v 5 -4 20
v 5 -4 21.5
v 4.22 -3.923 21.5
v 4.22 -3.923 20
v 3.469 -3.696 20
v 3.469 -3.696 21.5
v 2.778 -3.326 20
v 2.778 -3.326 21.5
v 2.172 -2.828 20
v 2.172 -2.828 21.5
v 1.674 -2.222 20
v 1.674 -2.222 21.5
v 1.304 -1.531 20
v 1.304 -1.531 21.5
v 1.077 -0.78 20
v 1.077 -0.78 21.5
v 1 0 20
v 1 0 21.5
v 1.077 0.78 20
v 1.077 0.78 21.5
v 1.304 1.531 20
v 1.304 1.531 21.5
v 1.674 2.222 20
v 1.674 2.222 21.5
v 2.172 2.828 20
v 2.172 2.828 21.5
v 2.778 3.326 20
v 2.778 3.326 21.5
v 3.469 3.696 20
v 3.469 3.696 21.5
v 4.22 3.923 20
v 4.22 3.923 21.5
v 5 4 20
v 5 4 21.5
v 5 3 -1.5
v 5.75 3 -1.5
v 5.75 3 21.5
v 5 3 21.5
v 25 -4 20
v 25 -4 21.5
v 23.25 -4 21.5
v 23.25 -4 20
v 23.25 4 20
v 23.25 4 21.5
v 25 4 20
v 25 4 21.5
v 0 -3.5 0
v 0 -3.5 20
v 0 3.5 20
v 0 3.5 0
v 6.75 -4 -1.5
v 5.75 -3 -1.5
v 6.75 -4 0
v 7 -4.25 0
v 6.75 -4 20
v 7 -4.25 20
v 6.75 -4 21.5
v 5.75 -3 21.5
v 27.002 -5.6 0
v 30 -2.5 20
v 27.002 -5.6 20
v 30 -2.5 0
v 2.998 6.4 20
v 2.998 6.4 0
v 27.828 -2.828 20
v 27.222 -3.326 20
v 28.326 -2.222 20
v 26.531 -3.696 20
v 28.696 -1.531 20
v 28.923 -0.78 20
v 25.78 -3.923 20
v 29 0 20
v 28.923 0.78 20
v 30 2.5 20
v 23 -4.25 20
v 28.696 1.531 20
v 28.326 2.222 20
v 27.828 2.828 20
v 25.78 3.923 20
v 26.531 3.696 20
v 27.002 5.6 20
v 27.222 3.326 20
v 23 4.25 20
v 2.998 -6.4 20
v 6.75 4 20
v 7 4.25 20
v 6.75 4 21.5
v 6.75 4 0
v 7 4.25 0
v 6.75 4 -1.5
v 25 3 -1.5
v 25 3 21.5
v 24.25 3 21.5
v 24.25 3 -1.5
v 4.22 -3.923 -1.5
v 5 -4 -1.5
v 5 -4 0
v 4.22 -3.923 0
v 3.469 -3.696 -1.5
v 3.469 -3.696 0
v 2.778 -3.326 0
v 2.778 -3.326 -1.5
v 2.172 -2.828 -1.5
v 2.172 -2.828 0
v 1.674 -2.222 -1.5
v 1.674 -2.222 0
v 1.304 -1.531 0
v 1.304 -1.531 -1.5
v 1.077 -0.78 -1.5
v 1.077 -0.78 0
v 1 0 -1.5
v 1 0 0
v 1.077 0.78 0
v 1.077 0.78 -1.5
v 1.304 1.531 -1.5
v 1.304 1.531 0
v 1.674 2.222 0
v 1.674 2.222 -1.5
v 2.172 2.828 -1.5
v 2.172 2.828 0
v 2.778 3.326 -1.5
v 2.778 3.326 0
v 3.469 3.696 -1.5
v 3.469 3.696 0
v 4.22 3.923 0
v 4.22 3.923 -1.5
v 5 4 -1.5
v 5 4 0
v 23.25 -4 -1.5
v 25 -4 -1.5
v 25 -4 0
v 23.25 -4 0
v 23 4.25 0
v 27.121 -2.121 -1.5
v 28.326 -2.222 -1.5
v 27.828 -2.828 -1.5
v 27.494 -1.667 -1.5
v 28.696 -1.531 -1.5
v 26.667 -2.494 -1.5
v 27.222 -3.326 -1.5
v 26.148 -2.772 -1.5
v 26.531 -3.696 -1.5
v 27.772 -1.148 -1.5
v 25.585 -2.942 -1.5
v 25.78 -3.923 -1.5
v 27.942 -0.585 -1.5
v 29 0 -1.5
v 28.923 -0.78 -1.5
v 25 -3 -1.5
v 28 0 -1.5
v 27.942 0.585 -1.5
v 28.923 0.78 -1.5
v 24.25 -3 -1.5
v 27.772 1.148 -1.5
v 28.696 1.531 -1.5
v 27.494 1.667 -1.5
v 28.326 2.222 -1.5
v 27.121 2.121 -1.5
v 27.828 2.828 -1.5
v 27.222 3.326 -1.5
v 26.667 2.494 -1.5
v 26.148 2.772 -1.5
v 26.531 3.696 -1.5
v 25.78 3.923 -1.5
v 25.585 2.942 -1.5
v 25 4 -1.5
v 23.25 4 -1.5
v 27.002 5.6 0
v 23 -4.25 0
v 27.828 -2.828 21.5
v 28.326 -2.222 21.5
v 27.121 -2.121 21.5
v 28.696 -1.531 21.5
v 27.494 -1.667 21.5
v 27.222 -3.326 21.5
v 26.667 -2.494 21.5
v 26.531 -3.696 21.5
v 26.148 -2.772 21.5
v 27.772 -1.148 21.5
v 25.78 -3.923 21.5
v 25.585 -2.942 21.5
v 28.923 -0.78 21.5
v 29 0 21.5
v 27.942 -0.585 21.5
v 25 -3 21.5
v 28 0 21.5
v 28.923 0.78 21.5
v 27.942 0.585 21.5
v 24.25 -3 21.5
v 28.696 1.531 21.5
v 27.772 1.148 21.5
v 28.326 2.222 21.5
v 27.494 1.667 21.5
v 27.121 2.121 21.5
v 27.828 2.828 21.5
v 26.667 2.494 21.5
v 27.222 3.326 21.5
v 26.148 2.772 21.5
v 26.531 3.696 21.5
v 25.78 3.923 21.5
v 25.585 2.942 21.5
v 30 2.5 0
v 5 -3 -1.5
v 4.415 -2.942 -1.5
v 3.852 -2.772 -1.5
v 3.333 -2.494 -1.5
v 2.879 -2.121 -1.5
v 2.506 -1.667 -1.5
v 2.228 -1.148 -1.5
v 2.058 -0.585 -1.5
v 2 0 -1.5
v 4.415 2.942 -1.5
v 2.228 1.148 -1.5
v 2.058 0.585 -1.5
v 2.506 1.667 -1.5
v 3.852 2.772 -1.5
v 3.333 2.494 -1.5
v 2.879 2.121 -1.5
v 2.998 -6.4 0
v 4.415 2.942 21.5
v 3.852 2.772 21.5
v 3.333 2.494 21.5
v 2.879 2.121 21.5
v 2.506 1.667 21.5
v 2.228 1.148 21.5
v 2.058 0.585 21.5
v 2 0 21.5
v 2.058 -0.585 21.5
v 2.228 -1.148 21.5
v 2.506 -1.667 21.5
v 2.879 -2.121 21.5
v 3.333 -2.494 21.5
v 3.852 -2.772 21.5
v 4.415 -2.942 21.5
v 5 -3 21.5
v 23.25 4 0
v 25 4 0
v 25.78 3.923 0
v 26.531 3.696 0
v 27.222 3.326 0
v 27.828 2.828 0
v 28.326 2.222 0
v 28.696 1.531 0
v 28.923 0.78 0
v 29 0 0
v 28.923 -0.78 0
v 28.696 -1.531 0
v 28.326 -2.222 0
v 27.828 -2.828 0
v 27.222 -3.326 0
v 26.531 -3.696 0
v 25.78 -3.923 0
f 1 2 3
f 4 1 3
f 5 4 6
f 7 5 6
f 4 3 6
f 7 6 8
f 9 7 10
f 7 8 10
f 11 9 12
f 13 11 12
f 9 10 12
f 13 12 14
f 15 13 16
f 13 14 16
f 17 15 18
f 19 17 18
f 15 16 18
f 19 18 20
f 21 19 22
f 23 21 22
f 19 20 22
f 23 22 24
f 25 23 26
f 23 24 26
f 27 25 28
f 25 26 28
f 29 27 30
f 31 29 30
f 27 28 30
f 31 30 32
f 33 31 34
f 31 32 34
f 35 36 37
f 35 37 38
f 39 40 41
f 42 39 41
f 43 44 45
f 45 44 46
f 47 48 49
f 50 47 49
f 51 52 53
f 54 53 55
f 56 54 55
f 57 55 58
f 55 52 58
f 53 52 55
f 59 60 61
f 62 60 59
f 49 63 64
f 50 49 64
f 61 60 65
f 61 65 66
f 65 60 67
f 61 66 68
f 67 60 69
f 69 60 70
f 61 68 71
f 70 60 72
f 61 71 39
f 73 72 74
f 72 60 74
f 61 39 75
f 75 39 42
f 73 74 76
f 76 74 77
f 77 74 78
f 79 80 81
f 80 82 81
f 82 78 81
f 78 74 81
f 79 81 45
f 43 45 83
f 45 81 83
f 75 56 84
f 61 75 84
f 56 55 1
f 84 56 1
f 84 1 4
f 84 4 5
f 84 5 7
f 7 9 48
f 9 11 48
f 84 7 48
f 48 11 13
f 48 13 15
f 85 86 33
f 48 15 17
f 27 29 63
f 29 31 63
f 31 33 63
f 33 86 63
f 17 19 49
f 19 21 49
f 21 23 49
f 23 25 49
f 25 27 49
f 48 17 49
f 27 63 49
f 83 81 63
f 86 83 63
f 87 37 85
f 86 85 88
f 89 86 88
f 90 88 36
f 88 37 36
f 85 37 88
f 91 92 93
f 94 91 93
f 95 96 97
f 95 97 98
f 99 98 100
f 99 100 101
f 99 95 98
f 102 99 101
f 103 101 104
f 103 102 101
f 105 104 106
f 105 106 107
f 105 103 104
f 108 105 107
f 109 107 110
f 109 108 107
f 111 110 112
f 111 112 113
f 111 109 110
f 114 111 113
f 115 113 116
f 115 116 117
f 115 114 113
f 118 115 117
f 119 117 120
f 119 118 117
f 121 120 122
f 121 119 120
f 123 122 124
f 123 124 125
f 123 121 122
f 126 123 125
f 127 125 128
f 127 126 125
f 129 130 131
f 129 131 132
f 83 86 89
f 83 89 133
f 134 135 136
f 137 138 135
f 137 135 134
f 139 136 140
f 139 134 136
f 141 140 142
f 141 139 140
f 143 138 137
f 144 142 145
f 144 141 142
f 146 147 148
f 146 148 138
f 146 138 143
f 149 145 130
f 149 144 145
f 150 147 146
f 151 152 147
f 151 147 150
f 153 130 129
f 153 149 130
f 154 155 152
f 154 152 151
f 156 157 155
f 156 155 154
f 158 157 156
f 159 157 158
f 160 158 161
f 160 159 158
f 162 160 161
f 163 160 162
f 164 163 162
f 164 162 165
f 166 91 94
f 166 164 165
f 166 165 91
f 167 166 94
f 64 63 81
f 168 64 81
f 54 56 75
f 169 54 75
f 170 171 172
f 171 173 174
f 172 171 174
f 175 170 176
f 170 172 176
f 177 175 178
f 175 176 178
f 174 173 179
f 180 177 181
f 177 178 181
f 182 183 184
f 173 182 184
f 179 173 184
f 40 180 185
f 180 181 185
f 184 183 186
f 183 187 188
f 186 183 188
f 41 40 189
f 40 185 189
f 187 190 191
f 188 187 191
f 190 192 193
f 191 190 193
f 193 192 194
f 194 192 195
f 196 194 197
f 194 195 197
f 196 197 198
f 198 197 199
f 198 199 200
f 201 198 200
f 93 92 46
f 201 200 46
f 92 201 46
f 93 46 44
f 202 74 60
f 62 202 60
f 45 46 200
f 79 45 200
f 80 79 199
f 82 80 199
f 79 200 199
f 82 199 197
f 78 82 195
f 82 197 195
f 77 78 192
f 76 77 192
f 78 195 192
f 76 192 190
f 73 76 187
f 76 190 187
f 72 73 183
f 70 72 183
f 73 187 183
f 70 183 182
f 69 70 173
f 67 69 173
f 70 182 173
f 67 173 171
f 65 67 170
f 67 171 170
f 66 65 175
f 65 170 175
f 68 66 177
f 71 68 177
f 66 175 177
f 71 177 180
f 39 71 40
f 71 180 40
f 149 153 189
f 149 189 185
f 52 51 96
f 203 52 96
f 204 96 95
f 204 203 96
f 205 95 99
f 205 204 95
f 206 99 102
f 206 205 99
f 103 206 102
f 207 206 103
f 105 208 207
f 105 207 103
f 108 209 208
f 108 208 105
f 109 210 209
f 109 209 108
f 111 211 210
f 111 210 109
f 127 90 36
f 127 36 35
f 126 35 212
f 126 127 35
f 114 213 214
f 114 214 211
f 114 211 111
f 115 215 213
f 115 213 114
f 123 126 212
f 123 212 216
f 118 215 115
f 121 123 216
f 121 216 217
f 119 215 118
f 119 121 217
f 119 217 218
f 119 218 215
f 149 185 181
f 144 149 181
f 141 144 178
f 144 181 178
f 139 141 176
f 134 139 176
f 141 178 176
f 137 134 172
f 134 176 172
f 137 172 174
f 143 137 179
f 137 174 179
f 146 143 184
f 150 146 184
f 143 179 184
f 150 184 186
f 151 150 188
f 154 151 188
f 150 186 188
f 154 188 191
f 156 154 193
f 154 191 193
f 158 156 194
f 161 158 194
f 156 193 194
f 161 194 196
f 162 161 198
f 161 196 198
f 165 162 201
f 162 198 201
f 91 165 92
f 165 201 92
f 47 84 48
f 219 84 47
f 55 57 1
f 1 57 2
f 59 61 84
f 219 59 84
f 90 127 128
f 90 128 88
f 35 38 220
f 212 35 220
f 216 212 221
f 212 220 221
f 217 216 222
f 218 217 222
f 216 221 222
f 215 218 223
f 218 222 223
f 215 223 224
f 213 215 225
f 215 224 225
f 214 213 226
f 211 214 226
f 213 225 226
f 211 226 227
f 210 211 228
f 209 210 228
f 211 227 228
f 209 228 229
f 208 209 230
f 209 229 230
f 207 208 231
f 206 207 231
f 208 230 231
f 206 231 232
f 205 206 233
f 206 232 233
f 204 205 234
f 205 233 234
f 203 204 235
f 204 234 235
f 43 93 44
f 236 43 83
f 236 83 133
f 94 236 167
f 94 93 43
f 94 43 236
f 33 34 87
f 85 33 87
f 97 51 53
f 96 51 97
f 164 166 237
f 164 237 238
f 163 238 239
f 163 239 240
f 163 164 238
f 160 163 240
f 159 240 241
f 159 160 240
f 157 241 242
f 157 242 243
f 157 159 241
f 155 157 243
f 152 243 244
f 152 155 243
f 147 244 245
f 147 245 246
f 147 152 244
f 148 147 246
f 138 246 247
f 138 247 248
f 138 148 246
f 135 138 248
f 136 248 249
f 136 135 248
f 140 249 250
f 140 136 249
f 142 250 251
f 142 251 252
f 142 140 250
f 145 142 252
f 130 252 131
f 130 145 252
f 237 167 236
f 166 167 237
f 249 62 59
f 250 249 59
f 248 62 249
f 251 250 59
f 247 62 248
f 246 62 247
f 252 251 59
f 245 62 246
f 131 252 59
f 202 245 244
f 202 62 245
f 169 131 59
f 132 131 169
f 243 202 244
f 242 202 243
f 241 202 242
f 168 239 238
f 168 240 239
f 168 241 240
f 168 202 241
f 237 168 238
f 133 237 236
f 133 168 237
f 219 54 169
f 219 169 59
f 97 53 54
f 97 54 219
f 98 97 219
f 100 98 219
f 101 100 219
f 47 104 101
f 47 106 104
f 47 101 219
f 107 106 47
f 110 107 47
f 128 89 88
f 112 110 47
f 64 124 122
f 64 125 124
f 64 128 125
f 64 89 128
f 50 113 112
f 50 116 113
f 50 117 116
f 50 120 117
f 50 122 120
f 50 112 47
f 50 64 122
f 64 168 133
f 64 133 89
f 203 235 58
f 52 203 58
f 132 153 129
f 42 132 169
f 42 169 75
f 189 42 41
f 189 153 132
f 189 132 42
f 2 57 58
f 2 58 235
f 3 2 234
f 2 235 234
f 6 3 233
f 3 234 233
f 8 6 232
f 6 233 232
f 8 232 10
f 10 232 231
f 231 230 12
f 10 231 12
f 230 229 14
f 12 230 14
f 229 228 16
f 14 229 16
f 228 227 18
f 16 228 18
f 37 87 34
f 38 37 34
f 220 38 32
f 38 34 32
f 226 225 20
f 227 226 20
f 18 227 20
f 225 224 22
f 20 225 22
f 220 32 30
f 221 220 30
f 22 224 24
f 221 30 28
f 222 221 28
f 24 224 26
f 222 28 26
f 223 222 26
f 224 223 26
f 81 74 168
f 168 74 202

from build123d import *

# Parameters (mm, degrees)
BOSS_EXTRUDE1_DEPTH      = 10
CHAMFER1_SIZE            = 3
BOSS_EXTRUDE2_START      = -1.5
BOSS_EXTRUDE2_DEPTH      = 1.5
CHAMFER1_OF_MIRROR1_SIZE = 3
SKETCH2_W                = 16
SKETCH2_H                = 8.5
CUT_EXTRUDE1_DEPTH       = 39.340066647
CHAMFER2_SIZE            = 1.25


with BuildPart() as part:
    # Sketch1 → Boss-Extrude1 (new body)
    # profile 1 of 2: a face of its own
    with BuildSketch(Plane.XY):
        Polygon((30, 5.5), (30, -5.5), (0, -6.5), (0, 6.5), align=None)
        with BuildLine():
            ThreePointArc((5, 4), (1, 0), (5, -4))
            Line((5, -4), (25, -4))
            ThreePointArc((25, -4), (29, 0), (25, 4))
            Line((25, 4), (5, 4))
        make_face(mode=Mode.SUBTRACT)
    # profile 2 of 2: a face of its own
    with BuildSketch(Plane.XY):
        with BuildLine():
            Line((5, 4), (25, 4))
            ThreePointArc((25, 4), (29, 0), (25, -4))
            Line((25, -4), (5, -4))
            ThreePointArc((5, -4), (1, 0), (5, 4))
        make_face()
        with BuildLine():
            ThreePointArc((25, -3), (28, 0), (25, 3))
            Line((25, 3), (5, 3))
            ThreePointArc((5, 3), (2, 0), (5, -3))
            Line((5, -3), (25, -3))
        make_face(mode=Mode.SUBTRACT)
    boss_extrude1 = extrude(amount=BOSS_EXTRUDE1_DEPTH)

    # Chamfer1
    chamfer1_edges = [part.edges().sort_by_distance(p)[0] for p in [
        (30, -5.5, 5),
        (0, -6.5, 5),
        (0, 6.5, 5),
        (30, 5.5, 5),
    ]]
    chamfer(chamfer1_edges, length=CHAMFER1_SIZE)

    # Sketch1<4> → Boss-Extrude2 (add)
    with BuildSketch(Plane.XY.offset(BOSS_EXTRUDE2_START)):
        with BuildLine():
            Line((5, 4), (25, 4))
            ThreePointArc((25, 4), (29, 0), (25, -4))
            Line((25, -4), (5, -4))
            ThreePointArc((5, -4), (1, 0), (5, 4))
        make_face()
        with BuildLine():
            ThreePointArc((25, -3), (28, 0), (25, 3))
            Line((25, 3), (5, 3))
            ThreePointArc((5, 3), (2, 0), (5, -3))
            Line((5, -3), (25, -3))
        make_face(mode=Mode.SUBTRACT)
    boss_extrude2 = extrude(amount=BOSS_EXTRUDE2_DEPTH)


with BuildPart() as mirror1_1:
    # Mirror1: Boss-Extrude1, Boss-Extrude2 across plane
    add(boss_extrude1.mirror(Plane.XY.offset(10)))
    add(boss_extrude2.mirror(Plane.XY.offset(10)))

    # Chamfer1 of Mirror1
    chamfer1_of_mirror1_edges = [mirror1_1.edges().sort_by_distance(p)[0] for p in [
        (30, -5.5, 15),
        (0, -6.5, 15),
        (0, 6.5, 15),
        (30, 5.5, 15),
    ]]
    chamfer(chamfer1_of_mirror1_edges, length=CHAMFER1_OF_MIRROR1_SIZE)


with BuildPart() as part_1:
    add(part.part)

    # Mirror1 united with what the copies touc: union Mirror1_1
    add(mirror1_1.part)

    # Sketch2 → Cut-Extrude1 (cut, through all)
    with BuildSketch(Plane.XY.offset(21.5)):
        with Locations((15, 0)):
            Rectangle(SKETCH2_W, SKETCH2_H)
    extrude(amount=-CUT_EXTRUDE1_DEPTH, mode=Mode.SUBTRACT)

    # Chamfer2
    chamfer2_edges = [part_1.edges().sort_by_distance(p)[0] for p in [
        (23, -3, 10),
        (23, 3, 10),
        (7, -3, 10),
        (7, 3, 10),
    ]]
    chamfer(chamfer2_edges, length=CHAMFER2_SIZE - 0.0001)  # a hair under: the kernel refuses the full size


solid = part_1.part
